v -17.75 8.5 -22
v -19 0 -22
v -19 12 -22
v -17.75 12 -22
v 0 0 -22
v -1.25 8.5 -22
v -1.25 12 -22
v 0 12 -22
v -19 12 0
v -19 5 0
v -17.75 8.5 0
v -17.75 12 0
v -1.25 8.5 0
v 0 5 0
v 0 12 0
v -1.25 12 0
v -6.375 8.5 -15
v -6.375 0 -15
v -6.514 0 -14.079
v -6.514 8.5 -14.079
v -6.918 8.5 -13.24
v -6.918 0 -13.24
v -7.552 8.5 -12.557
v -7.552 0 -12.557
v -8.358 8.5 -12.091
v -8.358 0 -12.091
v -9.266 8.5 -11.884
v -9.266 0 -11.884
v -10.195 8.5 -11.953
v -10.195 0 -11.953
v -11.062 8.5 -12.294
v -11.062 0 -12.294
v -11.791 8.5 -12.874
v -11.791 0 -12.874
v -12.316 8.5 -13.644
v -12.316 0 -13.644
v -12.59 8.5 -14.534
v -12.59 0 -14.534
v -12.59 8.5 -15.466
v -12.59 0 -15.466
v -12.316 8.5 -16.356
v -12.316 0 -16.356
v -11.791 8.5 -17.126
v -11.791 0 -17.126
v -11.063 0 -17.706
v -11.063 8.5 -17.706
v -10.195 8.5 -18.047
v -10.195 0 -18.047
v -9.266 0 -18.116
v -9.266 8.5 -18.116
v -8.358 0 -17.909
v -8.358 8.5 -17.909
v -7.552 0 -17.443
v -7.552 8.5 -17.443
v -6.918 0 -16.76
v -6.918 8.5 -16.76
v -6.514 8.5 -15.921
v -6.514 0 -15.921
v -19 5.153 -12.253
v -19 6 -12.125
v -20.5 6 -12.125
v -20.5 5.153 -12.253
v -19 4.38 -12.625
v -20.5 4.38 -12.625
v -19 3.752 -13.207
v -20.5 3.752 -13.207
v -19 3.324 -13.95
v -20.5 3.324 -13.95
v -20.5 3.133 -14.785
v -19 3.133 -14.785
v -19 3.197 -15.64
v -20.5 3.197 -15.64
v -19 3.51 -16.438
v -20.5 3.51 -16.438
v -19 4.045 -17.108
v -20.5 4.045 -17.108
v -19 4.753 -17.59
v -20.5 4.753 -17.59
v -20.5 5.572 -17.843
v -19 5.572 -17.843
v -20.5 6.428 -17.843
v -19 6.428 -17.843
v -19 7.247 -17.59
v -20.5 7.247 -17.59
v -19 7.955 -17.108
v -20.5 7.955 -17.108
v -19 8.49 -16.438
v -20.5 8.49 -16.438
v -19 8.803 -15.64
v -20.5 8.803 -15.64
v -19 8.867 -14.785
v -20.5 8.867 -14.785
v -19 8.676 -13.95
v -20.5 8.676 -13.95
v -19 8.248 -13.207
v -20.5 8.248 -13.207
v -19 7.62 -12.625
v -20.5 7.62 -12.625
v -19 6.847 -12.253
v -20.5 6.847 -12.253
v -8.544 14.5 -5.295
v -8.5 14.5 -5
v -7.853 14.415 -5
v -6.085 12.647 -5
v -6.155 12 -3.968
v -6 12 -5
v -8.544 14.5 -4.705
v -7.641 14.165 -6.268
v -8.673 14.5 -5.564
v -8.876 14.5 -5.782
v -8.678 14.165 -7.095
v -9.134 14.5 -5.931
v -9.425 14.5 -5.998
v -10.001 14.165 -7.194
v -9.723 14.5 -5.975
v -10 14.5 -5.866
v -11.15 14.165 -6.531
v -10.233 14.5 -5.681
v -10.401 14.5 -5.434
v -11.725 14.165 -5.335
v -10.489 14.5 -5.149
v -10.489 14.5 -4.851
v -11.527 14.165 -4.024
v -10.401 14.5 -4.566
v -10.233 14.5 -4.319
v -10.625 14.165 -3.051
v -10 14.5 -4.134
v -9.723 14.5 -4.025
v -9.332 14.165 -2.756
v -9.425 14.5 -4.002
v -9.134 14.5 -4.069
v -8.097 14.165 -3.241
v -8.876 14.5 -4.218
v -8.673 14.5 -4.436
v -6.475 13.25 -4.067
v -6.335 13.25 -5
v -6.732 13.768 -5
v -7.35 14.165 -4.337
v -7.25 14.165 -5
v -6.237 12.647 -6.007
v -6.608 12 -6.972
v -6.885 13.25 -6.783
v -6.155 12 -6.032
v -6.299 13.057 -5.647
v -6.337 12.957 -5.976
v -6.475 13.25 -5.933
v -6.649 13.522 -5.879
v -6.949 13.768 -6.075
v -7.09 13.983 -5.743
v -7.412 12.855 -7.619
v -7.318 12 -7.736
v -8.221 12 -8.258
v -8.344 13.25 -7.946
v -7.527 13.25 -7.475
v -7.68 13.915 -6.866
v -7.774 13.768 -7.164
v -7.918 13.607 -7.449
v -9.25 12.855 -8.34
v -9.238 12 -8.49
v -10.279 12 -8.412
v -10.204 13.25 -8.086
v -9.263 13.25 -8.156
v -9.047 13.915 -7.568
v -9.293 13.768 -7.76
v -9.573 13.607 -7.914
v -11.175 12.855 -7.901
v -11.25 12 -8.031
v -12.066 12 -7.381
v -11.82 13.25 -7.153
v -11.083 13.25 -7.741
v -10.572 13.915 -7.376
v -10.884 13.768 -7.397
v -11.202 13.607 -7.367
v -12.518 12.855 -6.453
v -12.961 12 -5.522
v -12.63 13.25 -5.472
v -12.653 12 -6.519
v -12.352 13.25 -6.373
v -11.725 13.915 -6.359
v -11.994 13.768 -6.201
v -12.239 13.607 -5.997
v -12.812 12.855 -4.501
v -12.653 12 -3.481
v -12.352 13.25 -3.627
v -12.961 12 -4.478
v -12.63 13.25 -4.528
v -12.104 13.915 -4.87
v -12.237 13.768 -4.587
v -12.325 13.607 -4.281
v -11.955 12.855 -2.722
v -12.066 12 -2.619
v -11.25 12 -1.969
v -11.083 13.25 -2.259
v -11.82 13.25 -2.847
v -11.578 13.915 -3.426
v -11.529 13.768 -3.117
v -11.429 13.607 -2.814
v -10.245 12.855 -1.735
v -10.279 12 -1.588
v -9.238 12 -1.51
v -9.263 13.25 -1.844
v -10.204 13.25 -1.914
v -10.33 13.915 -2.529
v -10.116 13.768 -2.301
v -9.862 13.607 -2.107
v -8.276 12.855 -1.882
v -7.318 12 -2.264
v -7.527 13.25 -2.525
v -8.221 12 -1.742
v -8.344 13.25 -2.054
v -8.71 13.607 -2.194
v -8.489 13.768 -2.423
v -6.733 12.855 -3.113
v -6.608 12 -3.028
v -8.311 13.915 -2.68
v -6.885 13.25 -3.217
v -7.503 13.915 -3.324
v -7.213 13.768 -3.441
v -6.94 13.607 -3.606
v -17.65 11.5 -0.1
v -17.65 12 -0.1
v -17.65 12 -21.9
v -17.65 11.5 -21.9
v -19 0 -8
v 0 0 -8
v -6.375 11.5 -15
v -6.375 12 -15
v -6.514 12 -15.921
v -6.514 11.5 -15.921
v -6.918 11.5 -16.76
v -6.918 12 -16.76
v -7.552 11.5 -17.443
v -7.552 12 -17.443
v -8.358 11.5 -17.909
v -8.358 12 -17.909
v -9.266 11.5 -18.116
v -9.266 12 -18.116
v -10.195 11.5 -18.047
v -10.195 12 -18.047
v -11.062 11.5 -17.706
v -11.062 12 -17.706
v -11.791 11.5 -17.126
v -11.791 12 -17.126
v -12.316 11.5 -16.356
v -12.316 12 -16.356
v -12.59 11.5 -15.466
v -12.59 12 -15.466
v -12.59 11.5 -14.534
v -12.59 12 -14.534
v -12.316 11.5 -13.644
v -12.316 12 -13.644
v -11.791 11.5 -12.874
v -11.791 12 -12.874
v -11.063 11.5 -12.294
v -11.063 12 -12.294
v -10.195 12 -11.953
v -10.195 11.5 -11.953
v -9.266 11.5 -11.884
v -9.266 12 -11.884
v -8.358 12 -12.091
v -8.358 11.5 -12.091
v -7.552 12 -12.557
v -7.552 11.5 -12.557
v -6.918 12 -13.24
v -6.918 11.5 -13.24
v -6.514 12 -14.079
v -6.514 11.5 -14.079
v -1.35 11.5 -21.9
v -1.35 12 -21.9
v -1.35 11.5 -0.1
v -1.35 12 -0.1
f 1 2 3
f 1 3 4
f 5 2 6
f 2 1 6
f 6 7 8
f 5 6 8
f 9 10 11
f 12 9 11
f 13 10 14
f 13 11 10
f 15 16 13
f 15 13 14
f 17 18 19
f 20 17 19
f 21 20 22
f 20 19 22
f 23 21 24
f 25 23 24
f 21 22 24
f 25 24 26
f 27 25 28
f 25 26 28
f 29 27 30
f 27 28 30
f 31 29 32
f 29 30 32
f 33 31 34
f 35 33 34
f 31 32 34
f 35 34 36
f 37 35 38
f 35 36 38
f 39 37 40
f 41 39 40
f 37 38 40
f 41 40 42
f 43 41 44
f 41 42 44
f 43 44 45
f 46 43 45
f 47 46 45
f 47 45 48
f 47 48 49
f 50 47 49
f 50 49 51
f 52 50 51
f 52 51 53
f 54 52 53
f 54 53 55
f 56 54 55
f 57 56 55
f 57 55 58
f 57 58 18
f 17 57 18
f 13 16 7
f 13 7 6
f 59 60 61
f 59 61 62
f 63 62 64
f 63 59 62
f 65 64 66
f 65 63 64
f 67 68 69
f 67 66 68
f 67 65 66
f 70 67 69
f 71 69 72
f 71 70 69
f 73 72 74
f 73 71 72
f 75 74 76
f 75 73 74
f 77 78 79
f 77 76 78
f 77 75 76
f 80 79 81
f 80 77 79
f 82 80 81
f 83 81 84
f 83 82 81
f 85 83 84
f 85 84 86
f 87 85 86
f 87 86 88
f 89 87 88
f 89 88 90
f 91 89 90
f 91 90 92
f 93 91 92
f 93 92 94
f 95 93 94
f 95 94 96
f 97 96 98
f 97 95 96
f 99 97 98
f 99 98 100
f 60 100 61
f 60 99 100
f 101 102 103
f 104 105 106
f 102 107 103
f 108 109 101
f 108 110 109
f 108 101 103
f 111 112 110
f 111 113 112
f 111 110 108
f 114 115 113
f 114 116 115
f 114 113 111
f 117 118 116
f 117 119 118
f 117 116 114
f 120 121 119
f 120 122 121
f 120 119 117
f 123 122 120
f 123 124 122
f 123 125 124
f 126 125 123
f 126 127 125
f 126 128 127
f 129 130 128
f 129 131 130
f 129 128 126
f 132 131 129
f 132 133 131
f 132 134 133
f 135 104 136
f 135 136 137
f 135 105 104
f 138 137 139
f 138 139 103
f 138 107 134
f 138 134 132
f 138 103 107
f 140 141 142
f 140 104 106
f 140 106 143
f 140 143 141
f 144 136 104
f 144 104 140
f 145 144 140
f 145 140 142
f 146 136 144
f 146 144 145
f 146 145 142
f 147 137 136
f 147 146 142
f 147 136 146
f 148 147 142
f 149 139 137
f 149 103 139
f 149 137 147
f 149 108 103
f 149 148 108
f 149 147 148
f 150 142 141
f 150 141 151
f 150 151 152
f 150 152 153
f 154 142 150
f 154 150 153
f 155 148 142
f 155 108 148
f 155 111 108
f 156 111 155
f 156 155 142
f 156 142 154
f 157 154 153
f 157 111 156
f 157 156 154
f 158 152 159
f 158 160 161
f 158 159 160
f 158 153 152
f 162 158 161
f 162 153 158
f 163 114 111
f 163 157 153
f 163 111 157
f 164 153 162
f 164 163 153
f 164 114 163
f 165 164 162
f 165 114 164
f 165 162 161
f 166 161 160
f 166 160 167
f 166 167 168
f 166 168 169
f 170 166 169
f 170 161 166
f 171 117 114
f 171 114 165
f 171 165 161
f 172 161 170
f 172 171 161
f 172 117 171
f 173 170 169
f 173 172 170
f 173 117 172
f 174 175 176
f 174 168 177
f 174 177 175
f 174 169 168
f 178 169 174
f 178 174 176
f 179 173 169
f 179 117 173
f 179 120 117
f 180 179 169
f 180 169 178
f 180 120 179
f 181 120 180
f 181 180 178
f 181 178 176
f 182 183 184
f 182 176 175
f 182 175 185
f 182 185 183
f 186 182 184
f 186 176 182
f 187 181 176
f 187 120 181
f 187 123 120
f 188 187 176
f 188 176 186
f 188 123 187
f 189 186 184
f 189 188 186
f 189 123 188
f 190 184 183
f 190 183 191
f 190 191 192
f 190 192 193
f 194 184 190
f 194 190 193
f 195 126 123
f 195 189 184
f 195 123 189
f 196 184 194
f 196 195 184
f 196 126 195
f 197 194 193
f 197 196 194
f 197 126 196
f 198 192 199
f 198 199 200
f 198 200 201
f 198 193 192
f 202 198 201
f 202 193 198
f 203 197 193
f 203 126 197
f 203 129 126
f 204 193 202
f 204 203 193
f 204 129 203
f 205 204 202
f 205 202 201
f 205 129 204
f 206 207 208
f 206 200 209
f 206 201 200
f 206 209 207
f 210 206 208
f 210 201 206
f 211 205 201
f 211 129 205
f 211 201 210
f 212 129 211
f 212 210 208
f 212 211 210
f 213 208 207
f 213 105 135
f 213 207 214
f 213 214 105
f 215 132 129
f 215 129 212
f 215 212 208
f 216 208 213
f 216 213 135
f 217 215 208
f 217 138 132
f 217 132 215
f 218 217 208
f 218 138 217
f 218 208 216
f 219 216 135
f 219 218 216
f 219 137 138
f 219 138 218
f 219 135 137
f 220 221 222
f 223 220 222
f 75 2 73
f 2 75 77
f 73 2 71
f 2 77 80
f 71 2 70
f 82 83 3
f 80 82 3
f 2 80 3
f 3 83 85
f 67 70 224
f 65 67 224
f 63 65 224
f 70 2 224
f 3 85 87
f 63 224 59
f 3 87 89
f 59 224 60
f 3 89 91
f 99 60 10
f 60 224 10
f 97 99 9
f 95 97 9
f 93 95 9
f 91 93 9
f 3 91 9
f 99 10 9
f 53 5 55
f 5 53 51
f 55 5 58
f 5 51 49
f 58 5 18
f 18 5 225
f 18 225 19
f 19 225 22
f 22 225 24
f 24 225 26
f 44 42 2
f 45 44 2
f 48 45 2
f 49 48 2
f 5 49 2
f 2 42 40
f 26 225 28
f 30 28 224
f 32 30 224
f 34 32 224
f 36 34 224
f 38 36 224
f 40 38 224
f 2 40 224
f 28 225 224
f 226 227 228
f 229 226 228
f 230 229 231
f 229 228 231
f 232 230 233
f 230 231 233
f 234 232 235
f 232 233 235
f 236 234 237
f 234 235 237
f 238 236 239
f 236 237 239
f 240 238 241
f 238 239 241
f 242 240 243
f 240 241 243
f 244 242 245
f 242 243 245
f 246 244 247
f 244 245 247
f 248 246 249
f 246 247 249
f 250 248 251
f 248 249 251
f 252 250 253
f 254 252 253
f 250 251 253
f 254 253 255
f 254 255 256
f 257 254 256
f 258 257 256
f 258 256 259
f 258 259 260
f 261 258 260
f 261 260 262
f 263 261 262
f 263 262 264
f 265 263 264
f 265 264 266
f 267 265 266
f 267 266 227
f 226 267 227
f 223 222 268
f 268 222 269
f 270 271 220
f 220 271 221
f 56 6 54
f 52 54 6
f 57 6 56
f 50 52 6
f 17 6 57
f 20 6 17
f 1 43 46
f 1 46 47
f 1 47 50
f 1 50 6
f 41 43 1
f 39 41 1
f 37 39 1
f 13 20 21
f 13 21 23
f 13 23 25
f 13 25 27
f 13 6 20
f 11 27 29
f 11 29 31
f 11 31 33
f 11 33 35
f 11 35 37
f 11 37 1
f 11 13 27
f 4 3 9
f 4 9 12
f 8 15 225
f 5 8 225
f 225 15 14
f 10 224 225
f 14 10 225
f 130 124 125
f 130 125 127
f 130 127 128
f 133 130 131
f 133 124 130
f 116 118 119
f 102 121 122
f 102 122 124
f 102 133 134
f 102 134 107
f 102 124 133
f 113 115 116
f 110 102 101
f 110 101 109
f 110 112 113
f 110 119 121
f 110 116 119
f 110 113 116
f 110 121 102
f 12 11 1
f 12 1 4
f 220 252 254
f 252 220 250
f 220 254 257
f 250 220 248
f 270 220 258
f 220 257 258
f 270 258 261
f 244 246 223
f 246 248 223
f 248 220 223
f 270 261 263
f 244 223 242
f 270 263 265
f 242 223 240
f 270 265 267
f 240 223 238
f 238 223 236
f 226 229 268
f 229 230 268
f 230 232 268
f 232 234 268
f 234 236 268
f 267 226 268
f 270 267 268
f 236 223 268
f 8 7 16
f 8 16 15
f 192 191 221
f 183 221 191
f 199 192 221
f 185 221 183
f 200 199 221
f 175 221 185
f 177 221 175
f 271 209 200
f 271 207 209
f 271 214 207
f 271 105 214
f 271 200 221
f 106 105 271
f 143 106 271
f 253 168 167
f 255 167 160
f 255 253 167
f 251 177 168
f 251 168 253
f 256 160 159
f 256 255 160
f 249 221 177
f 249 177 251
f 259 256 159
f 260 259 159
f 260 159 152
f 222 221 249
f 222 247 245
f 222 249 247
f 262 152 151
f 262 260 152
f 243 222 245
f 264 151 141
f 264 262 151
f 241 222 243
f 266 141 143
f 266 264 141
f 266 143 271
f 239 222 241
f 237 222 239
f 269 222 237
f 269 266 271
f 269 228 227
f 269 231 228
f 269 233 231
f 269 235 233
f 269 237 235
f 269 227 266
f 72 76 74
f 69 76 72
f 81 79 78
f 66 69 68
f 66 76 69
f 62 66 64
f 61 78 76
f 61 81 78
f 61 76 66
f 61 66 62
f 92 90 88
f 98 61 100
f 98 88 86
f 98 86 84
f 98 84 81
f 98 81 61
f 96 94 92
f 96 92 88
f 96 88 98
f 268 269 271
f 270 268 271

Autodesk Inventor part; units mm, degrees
ref_plane "YZ Plane" through (0, 0, 0) normal (1, 0, 0) x (0, 1, 0)
ref_plane "XZ Plane" through (0, 0, 0) normal (0, 1, 0) x (-1, 0, 0)
ref_plane "XY Plane" through (0, 0, 0) normal (0, 0, 1) x (1, 0, 0)
sketch "Sketch1" plane through (0, 0, 0) normal (0, 0, 1) x (1, 0, 0)
  line L0 (0, 0) -> (-19, 0)
  line L1 (-19, 0) -> (-19, 12)
  line L2 (-19, 12) -> (0, 12)
  line L3 (0, 12) -> (0, 0)
  line L4 (-17.75, 12) -> (-1.25, 12)
  line L5 (-1.25, 12) -> (-1.25, 8.5)
  line L6 (-1.25, 8.5) -> (-17.75, 8.5)
  line L7 (-17.75, 8.5) -> (-17.75, 12)
  point P0 (-1.25, 12)
  dimension "d0" = 19
  dimension "d1" = 12
  dimension "d2" = 16.5
  dimension "d3" = 3.5
  dimension "d4" = 1.25
extrude "Extrusion1" add sketch "Sketch1" against normal blind 22 contours L0 L1 L2 L7 L6 L5 L3
chamfer "Chamfer1" distance 5 distance2 8 1 edges at (-9.5, 0, 0) measured on face at (-6.75, 2.8333, 0)
sketch "Sketch2" plane through (-19, 0, -22) normal (0, -1, 0) x (1, 0, 0)
  line L0 (0, 14) -> (19, 14) construction
  line L1 (9.5, 14) -> (9.5, 0) construction
  line L2 (1.25, 0) -> (17.75, 0) construction
  circle A0 centre (9.5, 7) radius 3.125
  point P0 (19, 22)
  dimension "d10" = 6.25
extrude "Extrusion2" cut sketch "Sketch2" against normal up to next
sketch "Sketch3" plane through (-19, 12, 0) normal (0, 1, 0) x (1, 0, 0)
  circle A0 centre (9.5, 15) radius 3.125 projected
  line L0 (17.75, 0) -> (1.25, 0) projected
  line L1 (17.75, 0) -> (17.75, 22) projected
  line L2 (1.25, 22) -> (17.75, 22) projected
  line L3 (1.25, 0) -> (1.25, 22) projected
  line L4 (1.35, 21.9) -> (17.65, 21.9)
  line L5 (17.65, 21.9) -> (17.65, 0.1)
  line L6 (17.65, 0.1) -> (1.35, 0.1)
  line L7 (1.35, 0.1) -> (1.35, 21.9)
  point P0 (19, 0)
  dimension "d13" = 0.1
extrude "Extrusion3" add sketch "Sketch3" against normal blind 0.5 contours L4 L5 L6 L7
sketch "Sketch4" plane through (-19, 12, 0) normal (0, 1, 0) x (1, 0, 0)
  line L0 (17.65, 0.1) -> (1.35, 0.1) construction
  line L1 (9.5, 0.1) -> (9.5, 21.9) construction
  line L2 (17.65, 21.9) -> (1.35, 21.9) construction
  circle A0 centre (9.5, 5) radius 3.5
  circle A1 centre (9.5, 15) radius 3.125 projected
  point P0 (19, 0)
  dimension "d16" = 7
  dimension "d17" = 10
extrude "Extrusion4" add sketch "Sketch4" along normal blind 2.5 contours A0
fillet "Fillet1" radius 2.5 1 edges at (-13, 14.5, -5)
sketch "Sketch5" plane through (-19, 0, -22) normal (-1, 0, 0) x (0, 0, 1)
  line L0 (7, 12) -> (7, 0) construction
  line L1 (22, 5) -> (14, 0) construction
  line L2 (22, 12) -> (22, 5) construction
  line L3 (22, 12) -> (0, 12) construction
  line L4 (0, 0) -> (0, 12) construction
  line L5 (14, 0) -> (0, 0) construction
  circle A0 centre (7, 6) radius 2.875
  point P0 (22, 0)
  dimension "d21" = 5.75
extrude "Extrusion5" add sketch "Sketch5" along normal blind 1.5
equation "\"d4\" = -0.5 * d2 + 0.5 * d0"
properties part number "High Voltage Limit Switch Arm Coupler"
